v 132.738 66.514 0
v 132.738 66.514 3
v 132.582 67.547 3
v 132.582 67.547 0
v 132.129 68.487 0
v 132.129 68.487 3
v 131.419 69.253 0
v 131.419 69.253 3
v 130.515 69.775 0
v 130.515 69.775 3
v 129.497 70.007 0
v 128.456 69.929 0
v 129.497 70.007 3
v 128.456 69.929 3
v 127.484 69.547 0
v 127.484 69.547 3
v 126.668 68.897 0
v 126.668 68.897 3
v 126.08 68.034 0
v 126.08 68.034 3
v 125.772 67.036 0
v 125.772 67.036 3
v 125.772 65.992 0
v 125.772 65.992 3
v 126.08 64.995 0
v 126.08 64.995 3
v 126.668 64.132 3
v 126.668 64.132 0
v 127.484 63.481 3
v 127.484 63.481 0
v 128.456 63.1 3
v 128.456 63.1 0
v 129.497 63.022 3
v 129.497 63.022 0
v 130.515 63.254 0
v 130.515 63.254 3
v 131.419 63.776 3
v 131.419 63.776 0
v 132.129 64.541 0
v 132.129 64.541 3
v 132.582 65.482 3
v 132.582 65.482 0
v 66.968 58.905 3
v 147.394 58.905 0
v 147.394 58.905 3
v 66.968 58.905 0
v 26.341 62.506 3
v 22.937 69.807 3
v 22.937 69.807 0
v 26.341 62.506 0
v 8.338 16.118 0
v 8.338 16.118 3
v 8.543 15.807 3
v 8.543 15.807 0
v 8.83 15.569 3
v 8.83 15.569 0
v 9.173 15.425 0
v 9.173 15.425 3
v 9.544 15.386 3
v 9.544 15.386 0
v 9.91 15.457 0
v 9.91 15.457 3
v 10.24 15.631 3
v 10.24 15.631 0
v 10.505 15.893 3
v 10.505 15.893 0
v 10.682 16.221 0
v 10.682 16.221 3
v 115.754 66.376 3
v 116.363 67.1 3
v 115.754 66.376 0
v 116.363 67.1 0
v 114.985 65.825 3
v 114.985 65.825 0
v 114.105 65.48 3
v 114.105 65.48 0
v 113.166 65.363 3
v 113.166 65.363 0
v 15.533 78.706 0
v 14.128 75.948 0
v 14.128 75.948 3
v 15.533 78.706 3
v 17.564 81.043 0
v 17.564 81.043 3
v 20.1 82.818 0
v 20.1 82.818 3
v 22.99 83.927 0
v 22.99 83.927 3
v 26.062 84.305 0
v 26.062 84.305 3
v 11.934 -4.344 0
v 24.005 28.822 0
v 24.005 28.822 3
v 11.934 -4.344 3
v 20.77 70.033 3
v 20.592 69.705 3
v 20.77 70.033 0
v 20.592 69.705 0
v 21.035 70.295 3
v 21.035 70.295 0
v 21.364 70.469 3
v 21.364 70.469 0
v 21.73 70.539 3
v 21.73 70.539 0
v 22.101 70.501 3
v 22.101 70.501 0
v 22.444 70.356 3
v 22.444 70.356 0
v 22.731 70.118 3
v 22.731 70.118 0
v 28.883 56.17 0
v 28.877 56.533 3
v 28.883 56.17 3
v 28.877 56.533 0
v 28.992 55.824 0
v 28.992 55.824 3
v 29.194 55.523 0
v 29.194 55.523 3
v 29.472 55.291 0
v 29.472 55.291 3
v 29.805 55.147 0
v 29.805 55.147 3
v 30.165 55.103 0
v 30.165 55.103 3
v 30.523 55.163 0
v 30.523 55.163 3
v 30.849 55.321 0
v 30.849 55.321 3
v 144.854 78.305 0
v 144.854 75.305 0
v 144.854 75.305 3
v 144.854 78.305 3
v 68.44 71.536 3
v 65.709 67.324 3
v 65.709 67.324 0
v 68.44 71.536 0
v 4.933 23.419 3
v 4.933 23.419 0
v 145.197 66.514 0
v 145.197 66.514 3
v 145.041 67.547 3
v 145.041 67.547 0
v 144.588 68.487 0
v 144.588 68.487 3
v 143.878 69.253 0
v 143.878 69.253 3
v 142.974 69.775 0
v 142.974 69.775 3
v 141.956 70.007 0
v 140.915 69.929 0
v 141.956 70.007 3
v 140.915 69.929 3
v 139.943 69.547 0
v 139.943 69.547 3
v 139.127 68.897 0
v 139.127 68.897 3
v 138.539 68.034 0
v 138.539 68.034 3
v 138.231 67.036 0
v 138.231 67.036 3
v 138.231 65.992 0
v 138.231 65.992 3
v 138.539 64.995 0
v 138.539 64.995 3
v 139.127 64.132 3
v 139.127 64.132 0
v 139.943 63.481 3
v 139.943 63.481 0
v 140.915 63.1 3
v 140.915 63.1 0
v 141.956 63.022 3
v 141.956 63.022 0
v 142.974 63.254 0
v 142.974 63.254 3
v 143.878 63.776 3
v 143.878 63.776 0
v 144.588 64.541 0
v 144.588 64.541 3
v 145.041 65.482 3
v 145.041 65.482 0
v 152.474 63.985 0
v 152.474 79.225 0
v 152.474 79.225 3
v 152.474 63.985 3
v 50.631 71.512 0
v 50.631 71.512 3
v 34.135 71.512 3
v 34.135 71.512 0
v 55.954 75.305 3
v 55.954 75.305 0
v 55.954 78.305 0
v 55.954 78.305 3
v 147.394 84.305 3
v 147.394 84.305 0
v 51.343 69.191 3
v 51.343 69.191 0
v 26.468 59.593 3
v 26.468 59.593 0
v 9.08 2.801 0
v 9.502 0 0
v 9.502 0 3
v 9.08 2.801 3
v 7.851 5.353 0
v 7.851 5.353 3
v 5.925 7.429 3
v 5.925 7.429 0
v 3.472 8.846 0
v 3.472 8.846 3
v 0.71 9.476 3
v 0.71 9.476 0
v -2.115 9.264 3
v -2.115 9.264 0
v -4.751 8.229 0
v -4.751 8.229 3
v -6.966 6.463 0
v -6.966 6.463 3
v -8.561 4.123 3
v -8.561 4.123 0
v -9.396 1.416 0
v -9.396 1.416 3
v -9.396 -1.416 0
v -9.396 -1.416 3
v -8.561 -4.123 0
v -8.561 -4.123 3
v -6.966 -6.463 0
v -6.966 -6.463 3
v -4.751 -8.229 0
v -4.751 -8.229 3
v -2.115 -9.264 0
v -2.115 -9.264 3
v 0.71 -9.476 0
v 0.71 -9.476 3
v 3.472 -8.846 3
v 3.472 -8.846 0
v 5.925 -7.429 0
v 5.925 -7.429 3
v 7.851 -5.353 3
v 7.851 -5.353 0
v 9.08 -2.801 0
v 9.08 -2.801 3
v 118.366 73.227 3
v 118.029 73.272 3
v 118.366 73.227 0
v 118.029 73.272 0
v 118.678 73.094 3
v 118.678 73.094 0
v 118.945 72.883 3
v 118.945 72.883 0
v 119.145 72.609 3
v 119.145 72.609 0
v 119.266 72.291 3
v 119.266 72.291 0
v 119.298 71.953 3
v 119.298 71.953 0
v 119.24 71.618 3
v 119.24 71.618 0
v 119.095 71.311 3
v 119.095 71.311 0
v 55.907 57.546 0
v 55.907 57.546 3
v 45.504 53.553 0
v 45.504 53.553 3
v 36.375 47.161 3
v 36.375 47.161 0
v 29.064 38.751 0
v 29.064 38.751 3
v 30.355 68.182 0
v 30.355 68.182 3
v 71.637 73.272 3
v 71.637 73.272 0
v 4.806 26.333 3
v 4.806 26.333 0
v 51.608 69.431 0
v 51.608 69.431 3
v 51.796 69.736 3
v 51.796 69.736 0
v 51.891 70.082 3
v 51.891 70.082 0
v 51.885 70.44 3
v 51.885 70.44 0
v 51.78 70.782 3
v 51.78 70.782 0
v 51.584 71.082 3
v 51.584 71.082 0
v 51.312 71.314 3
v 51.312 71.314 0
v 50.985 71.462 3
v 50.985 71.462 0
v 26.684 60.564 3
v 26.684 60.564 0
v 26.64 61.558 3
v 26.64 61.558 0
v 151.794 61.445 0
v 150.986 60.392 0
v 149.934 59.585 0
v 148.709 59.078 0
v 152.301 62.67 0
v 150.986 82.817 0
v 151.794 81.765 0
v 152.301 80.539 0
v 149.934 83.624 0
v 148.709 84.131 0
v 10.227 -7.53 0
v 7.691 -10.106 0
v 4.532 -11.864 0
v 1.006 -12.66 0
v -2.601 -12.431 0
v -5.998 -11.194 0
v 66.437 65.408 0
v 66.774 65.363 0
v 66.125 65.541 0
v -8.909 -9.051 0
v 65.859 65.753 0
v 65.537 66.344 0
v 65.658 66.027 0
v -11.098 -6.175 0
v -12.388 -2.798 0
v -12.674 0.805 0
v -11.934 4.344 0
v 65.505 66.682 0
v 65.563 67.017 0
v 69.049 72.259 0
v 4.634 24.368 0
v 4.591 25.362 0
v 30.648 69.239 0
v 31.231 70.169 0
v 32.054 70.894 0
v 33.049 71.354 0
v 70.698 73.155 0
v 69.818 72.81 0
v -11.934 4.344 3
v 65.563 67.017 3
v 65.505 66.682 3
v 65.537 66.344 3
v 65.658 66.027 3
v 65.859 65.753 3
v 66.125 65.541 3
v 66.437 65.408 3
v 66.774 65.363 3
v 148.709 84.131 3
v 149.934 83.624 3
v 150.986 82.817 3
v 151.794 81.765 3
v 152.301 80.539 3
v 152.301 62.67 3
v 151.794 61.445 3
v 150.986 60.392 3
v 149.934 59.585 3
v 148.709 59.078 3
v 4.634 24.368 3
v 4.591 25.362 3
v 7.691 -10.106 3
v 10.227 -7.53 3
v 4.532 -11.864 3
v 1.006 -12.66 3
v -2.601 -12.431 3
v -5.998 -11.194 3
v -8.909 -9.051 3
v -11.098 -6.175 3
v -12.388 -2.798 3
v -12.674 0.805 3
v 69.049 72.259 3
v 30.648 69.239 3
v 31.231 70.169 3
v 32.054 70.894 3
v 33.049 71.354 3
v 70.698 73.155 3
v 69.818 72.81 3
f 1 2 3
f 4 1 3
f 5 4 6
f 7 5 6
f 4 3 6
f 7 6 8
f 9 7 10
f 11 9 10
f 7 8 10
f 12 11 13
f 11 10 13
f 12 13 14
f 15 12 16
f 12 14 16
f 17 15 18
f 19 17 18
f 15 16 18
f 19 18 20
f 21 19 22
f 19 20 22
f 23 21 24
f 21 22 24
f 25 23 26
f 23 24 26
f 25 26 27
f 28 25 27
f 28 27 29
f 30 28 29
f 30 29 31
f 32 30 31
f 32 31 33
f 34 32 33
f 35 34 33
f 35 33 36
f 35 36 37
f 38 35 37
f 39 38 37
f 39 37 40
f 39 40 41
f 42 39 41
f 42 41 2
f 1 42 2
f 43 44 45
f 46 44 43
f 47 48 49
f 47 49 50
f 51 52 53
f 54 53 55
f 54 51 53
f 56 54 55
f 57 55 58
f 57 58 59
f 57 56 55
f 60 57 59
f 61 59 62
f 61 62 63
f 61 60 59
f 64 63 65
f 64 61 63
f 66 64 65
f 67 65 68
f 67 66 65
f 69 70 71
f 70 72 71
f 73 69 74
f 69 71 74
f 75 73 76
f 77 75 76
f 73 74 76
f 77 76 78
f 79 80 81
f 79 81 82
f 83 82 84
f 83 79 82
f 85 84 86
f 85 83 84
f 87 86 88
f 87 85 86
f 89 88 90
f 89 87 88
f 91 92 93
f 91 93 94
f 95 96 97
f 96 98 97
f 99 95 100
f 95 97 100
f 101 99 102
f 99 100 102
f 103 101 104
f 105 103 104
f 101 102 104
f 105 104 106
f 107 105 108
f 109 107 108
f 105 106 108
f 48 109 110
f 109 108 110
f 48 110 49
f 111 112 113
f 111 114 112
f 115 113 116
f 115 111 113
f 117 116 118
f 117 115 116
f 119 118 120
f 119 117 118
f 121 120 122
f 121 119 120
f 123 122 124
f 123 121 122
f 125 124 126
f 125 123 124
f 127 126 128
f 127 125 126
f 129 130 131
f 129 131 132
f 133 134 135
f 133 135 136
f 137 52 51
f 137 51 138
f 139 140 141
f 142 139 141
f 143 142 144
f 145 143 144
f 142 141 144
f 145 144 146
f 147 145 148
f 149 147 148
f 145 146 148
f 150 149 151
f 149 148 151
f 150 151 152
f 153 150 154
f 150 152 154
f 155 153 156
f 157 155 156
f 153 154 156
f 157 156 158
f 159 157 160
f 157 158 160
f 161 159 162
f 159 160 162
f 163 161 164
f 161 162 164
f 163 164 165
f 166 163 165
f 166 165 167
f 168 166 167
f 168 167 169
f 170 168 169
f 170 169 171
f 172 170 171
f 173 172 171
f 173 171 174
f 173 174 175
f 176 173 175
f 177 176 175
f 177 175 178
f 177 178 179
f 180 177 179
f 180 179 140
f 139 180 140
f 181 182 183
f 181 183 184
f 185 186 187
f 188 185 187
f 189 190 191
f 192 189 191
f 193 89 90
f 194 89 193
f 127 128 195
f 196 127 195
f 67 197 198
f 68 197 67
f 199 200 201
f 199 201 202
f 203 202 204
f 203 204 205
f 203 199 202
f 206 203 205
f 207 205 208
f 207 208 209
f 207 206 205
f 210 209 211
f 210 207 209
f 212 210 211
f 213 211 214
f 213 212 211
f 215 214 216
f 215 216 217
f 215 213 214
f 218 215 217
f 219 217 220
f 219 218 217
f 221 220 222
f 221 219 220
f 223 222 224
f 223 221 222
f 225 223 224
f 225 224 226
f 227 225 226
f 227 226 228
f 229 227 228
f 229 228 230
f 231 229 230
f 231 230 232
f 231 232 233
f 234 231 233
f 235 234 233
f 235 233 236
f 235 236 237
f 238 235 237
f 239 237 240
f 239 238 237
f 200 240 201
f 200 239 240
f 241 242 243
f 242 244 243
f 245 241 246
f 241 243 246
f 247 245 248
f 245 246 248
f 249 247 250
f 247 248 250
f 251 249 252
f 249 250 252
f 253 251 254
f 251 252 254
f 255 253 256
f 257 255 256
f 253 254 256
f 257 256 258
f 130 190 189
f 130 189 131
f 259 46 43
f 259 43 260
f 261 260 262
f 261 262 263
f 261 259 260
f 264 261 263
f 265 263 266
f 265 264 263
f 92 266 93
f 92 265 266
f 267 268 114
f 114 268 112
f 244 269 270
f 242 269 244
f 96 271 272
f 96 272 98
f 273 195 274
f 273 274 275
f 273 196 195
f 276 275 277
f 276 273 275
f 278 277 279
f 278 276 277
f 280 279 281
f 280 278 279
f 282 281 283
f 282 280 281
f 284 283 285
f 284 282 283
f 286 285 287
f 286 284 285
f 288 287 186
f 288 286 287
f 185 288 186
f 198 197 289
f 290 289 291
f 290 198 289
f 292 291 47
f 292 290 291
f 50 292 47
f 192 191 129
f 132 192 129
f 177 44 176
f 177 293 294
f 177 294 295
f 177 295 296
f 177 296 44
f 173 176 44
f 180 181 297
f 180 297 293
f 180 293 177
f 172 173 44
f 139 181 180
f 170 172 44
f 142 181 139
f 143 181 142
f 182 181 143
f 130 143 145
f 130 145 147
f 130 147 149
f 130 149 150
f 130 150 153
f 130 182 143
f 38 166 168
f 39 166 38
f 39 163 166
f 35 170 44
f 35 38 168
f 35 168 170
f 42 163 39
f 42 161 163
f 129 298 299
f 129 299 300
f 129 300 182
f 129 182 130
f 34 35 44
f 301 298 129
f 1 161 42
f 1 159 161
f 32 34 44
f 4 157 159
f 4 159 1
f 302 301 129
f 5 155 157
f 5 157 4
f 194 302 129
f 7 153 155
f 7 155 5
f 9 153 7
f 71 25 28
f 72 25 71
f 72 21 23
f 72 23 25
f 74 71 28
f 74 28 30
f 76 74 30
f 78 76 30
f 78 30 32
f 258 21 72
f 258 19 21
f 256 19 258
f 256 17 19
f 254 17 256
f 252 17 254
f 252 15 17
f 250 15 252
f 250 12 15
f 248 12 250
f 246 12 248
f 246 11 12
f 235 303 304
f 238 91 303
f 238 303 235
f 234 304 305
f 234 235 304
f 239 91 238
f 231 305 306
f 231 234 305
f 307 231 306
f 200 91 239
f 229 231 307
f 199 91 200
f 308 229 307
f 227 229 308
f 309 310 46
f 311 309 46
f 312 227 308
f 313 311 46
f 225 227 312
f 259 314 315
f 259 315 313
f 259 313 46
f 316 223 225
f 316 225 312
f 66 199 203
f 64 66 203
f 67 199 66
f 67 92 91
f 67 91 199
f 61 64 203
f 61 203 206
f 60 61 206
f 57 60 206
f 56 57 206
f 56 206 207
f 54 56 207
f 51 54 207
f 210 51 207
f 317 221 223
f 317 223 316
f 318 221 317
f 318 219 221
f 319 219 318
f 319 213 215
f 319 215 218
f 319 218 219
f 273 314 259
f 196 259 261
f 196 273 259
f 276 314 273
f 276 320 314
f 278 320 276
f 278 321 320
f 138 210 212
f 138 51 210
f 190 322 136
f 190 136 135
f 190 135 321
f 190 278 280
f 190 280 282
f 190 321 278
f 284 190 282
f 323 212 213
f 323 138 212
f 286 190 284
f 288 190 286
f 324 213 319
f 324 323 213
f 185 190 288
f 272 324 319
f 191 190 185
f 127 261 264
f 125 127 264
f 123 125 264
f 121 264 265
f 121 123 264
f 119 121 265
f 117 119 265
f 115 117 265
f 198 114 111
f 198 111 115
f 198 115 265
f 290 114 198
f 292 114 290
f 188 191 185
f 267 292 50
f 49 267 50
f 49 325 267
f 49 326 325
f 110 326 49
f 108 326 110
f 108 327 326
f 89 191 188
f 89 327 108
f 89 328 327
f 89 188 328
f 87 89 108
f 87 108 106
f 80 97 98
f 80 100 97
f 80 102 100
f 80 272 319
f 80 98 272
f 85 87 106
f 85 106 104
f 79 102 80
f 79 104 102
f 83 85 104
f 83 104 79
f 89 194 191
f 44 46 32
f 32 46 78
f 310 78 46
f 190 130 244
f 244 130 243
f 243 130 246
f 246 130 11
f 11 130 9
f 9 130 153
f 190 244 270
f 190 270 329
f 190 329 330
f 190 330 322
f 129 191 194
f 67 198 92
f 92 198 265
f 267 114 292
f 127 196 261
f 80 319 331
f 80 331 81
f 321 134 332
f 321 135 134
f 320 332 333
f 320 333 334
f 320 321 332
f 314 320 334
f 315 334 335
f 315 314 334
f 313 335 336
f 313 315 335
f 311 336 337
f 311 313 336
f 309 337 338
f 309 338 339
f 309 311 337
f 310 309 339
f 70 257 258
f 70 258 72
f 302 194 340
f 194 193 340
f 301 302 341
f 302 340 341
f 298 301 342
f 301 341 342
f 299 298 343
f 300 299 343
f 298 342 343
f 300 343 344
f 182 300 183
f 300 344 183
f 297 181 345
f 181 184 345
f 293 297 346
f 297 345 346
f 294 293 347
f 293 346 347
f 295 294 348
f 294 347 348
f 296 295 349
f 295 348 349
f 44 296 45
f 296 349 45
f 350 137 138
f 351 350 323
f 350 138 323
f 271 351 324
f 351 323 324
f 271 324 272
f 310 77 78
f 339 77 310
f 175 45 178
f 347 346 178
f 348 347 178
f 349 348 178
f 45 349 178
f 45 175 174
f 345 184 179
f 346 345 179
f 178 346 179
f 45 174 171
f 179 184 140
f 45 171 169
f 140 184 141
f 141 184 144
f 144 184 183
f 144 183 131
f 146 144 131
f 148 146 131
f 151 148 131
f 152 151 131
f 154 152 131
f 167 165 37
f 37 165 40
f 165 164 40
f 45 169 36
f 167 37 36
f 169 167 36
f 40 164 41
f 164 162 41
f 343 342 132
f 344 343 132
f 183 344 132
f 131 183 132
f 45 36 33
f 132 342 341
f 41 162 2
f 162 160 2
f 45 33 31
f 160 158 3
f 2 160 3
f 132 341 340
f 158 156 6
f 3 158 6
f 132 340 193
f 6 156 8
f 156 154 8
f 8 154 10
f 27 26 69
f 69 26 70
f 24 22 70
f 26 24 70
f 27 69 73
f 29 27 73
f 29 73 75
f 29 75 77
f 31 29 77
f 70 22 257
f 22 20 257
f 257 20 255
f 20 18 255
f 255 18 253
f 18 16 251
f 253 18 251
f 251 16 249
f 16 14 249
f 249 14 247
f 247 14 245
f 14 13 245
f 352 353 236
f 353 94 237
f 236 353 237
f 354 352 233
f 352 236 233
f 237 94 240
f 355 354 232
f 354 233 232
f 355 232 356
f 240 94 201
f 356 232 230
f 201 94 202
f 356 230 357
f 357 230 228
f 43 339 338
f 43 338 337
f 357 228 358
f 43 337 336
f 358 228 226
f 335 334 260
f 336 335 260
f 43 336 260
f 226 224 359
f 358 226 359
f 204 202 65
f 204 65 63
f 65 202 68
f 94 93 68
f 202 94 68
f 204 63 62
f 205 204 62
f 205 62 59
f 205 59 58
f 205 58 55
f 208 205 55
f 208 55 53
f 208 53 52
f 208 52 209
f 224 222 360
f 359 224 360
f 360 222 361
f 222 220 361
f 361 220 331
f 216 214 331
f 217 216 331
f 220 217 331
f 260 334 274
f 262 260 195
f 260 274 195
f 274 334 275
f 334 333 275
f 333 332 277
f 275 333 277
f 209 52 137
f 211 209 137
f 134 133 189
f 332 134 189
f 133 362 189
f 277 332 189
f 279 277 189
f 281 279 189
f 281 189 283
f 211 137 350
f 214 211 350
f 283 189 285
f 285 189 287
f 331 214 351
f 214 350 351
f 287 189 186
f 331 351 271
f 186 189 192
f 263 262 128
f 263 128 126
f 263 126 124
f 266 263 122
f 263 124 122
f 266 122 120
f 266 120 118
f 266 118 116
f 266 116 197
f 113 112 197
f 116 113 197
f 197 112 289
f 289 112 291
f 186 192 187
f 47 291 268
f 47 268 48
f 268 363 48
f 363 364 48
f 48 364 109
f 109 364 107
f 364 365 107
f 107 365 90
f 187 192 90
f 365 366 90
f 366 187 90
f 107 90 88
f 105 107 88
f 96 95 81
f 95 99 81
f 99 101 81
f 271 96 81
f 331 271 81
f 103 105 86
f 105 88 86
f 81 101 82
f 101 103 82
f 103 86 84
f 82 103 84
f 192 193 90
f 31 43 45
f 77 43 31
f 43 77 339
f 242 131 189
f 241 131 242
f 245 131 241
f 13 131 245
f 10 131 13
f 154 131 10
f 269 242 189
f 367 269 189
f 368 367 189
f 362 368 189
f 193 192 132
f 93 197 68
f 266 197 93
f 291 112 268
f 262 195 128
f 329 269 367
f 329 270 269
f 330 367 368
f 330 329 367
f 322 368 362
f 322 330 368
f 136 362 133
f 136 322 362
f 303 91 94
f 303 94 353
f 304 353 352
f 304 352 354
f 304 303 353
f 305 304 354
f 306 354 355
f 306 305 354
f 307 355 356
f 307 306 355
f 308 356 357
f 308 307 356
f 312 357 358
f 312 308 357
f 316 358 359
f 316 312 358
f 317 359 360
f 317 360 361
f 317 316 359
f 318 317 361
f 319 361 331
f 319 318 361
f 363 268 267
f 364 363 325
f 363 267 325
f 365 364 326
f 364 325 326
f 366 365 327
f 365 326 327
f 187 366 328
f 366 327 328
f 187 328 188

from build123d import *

# Parameters (mm, degrees)
SKETCH1_R           = 9.5025
SKETCH1_W           = 88.9
SKETCH1_H           = 3
BOSS_EXTRUDE1_DEPTH = 3
CUT_EXTRUDE1_DEPTH  = 4
CUT_EXTRUDE2_DEPTH  = 127
FILLET1_R           = 3.81
FILLET2_R           = 1.27
FILLET3_R           = 5.08
SKETCH4_R           = 3.5025
CUT_EXTRUDE3_DEPTH  = 16.002


with BuildPart() as part:
    # Sketch1 → Boss-Extrude1 (new body)
    with BuildSketch(Plane.XY):
        with BuildLine():
            Line((-11.934096284, 4.34365582), (14.127838637, 75.948233524))
            ThreePointArc((14.127838637, 75.948233524), (18.77751418, 82.007808666), (26.061934921, 84.304577704))
            Line((26.061934921, 84.304577704), (152.474181009, 84.304577704))
            Line((152.474181009, 84.304577704), (152.474181009, 58.904577704))
            Line((152.474181009, 58.904577704), (66.968059304, 58.904577704))
            ThreePointArc((66.968059304, 58.904577704), (40.744144634, 50.636209169), (24.005312681, 28.821738657))
            Line((24.005312681, 28.821738657), (11.934096284, -4.34365582))
            ThreePointArc((11.934096284, -4.34365582), (-4.34365582, -11.934096284), (-11.934096284, 4.34365582))
        make_face()
        Circle(SKETCH1_R, mode=Mode.SUBTRACT)
        with Locations((100.404181009, 76.804577704)):
            Rectangle(SKETCH1_W, SKETCH1_H, mode=Mode.SUBTRACT)
    extrude(amount=BOSS_EXTRUDE1_DEPTH)

    # Sketch2 → Cut-Extrude1 (cut, through all)
    with BuildSketch(Plane.XY.offset(3)):
        Polygon((27.008098555, 61.075884743), (9.633475274, 13.339499607), (4.26622335, 24.849608502), (21.640846631, 72.585993638), align=None)
    extrude(amount=-CUT_EXTRUDE1_DEPTH, mode=Mode.SUBTRACT)

    # Sketch3 → Cut-Extrude2 (cut)
    with BuildSketch(Plane.XY.offset(3)):
        Polygon((30.777663682, 71.512392484), (28.523924397, 53.747624001), (54.773358423, 71.512392484), align=None)
        Polygon((64.436448885, 65.362999195), (69.566826389, 73.272331181), (120.366826389, 73.272331181), (115.236448885, 65.362999195), align=None)
    extrude(amount=-CUT_EXTRUDE2_DEPTH, mode=Mode.SUBTRACT)

    # Fillet1
    fillet1_edges = [part.edges().sort_by_distance(p)[0] for p in [
        (27.008098555, 61.075884743, 1.5),
        (4.26622335, 24.849608502, 1.5),
        (30.777663682, 71.512392484, 1.5),
        (115.236448885, 65.362999195, 1.5),
        (69.566826389, 73.272331181, 1.5),
    ]]
    fillet(fillet1_edges, radius=FILLET1_R)

    # Fillet2
    fillet2_edges = [part.edges().sort_by_distance(p)[0] for p in [
        (9.633475274, 13.339499607, 1.5),
        (21.640846631, 72.585993638, 1.5),
        (54.773358423, 71.512392484, 1.5),
        (28.523924397, 53.747624001, 1.5),
        (64.436448885, 65.362999195, 1.5),
        (120.366826389, 73.272331181, 1.5),
    ]]
    fillet(fillet2_edges, radius=FILLET2_R)

    # Fillet3
    fillet3_edges = [part.edges().sort_by_distance(p)[0] for p in [
        (152.474181009, 84.304577704, 1.5),
        (152.474181009, 58.904577704, 1.5),
    ]]
    fillet(fillet3_edges, radius=FILLET3_R)

    # Sketch4 → Cut-Extrude3 (cut)
    with BuildSketch(Plane.XY.offset(3)):
        with Locations((141.694177318, 66.514238531)):
            Circle(SKETCH4_R)
        with Locations((129.235425653, 66.514238531)):
            Circle(SKETCH4_R)
    extrude(amount=-CUT_EXTRUDE3_DEPTH, mode=Mode.SUBTRACT)


solid = part.part
